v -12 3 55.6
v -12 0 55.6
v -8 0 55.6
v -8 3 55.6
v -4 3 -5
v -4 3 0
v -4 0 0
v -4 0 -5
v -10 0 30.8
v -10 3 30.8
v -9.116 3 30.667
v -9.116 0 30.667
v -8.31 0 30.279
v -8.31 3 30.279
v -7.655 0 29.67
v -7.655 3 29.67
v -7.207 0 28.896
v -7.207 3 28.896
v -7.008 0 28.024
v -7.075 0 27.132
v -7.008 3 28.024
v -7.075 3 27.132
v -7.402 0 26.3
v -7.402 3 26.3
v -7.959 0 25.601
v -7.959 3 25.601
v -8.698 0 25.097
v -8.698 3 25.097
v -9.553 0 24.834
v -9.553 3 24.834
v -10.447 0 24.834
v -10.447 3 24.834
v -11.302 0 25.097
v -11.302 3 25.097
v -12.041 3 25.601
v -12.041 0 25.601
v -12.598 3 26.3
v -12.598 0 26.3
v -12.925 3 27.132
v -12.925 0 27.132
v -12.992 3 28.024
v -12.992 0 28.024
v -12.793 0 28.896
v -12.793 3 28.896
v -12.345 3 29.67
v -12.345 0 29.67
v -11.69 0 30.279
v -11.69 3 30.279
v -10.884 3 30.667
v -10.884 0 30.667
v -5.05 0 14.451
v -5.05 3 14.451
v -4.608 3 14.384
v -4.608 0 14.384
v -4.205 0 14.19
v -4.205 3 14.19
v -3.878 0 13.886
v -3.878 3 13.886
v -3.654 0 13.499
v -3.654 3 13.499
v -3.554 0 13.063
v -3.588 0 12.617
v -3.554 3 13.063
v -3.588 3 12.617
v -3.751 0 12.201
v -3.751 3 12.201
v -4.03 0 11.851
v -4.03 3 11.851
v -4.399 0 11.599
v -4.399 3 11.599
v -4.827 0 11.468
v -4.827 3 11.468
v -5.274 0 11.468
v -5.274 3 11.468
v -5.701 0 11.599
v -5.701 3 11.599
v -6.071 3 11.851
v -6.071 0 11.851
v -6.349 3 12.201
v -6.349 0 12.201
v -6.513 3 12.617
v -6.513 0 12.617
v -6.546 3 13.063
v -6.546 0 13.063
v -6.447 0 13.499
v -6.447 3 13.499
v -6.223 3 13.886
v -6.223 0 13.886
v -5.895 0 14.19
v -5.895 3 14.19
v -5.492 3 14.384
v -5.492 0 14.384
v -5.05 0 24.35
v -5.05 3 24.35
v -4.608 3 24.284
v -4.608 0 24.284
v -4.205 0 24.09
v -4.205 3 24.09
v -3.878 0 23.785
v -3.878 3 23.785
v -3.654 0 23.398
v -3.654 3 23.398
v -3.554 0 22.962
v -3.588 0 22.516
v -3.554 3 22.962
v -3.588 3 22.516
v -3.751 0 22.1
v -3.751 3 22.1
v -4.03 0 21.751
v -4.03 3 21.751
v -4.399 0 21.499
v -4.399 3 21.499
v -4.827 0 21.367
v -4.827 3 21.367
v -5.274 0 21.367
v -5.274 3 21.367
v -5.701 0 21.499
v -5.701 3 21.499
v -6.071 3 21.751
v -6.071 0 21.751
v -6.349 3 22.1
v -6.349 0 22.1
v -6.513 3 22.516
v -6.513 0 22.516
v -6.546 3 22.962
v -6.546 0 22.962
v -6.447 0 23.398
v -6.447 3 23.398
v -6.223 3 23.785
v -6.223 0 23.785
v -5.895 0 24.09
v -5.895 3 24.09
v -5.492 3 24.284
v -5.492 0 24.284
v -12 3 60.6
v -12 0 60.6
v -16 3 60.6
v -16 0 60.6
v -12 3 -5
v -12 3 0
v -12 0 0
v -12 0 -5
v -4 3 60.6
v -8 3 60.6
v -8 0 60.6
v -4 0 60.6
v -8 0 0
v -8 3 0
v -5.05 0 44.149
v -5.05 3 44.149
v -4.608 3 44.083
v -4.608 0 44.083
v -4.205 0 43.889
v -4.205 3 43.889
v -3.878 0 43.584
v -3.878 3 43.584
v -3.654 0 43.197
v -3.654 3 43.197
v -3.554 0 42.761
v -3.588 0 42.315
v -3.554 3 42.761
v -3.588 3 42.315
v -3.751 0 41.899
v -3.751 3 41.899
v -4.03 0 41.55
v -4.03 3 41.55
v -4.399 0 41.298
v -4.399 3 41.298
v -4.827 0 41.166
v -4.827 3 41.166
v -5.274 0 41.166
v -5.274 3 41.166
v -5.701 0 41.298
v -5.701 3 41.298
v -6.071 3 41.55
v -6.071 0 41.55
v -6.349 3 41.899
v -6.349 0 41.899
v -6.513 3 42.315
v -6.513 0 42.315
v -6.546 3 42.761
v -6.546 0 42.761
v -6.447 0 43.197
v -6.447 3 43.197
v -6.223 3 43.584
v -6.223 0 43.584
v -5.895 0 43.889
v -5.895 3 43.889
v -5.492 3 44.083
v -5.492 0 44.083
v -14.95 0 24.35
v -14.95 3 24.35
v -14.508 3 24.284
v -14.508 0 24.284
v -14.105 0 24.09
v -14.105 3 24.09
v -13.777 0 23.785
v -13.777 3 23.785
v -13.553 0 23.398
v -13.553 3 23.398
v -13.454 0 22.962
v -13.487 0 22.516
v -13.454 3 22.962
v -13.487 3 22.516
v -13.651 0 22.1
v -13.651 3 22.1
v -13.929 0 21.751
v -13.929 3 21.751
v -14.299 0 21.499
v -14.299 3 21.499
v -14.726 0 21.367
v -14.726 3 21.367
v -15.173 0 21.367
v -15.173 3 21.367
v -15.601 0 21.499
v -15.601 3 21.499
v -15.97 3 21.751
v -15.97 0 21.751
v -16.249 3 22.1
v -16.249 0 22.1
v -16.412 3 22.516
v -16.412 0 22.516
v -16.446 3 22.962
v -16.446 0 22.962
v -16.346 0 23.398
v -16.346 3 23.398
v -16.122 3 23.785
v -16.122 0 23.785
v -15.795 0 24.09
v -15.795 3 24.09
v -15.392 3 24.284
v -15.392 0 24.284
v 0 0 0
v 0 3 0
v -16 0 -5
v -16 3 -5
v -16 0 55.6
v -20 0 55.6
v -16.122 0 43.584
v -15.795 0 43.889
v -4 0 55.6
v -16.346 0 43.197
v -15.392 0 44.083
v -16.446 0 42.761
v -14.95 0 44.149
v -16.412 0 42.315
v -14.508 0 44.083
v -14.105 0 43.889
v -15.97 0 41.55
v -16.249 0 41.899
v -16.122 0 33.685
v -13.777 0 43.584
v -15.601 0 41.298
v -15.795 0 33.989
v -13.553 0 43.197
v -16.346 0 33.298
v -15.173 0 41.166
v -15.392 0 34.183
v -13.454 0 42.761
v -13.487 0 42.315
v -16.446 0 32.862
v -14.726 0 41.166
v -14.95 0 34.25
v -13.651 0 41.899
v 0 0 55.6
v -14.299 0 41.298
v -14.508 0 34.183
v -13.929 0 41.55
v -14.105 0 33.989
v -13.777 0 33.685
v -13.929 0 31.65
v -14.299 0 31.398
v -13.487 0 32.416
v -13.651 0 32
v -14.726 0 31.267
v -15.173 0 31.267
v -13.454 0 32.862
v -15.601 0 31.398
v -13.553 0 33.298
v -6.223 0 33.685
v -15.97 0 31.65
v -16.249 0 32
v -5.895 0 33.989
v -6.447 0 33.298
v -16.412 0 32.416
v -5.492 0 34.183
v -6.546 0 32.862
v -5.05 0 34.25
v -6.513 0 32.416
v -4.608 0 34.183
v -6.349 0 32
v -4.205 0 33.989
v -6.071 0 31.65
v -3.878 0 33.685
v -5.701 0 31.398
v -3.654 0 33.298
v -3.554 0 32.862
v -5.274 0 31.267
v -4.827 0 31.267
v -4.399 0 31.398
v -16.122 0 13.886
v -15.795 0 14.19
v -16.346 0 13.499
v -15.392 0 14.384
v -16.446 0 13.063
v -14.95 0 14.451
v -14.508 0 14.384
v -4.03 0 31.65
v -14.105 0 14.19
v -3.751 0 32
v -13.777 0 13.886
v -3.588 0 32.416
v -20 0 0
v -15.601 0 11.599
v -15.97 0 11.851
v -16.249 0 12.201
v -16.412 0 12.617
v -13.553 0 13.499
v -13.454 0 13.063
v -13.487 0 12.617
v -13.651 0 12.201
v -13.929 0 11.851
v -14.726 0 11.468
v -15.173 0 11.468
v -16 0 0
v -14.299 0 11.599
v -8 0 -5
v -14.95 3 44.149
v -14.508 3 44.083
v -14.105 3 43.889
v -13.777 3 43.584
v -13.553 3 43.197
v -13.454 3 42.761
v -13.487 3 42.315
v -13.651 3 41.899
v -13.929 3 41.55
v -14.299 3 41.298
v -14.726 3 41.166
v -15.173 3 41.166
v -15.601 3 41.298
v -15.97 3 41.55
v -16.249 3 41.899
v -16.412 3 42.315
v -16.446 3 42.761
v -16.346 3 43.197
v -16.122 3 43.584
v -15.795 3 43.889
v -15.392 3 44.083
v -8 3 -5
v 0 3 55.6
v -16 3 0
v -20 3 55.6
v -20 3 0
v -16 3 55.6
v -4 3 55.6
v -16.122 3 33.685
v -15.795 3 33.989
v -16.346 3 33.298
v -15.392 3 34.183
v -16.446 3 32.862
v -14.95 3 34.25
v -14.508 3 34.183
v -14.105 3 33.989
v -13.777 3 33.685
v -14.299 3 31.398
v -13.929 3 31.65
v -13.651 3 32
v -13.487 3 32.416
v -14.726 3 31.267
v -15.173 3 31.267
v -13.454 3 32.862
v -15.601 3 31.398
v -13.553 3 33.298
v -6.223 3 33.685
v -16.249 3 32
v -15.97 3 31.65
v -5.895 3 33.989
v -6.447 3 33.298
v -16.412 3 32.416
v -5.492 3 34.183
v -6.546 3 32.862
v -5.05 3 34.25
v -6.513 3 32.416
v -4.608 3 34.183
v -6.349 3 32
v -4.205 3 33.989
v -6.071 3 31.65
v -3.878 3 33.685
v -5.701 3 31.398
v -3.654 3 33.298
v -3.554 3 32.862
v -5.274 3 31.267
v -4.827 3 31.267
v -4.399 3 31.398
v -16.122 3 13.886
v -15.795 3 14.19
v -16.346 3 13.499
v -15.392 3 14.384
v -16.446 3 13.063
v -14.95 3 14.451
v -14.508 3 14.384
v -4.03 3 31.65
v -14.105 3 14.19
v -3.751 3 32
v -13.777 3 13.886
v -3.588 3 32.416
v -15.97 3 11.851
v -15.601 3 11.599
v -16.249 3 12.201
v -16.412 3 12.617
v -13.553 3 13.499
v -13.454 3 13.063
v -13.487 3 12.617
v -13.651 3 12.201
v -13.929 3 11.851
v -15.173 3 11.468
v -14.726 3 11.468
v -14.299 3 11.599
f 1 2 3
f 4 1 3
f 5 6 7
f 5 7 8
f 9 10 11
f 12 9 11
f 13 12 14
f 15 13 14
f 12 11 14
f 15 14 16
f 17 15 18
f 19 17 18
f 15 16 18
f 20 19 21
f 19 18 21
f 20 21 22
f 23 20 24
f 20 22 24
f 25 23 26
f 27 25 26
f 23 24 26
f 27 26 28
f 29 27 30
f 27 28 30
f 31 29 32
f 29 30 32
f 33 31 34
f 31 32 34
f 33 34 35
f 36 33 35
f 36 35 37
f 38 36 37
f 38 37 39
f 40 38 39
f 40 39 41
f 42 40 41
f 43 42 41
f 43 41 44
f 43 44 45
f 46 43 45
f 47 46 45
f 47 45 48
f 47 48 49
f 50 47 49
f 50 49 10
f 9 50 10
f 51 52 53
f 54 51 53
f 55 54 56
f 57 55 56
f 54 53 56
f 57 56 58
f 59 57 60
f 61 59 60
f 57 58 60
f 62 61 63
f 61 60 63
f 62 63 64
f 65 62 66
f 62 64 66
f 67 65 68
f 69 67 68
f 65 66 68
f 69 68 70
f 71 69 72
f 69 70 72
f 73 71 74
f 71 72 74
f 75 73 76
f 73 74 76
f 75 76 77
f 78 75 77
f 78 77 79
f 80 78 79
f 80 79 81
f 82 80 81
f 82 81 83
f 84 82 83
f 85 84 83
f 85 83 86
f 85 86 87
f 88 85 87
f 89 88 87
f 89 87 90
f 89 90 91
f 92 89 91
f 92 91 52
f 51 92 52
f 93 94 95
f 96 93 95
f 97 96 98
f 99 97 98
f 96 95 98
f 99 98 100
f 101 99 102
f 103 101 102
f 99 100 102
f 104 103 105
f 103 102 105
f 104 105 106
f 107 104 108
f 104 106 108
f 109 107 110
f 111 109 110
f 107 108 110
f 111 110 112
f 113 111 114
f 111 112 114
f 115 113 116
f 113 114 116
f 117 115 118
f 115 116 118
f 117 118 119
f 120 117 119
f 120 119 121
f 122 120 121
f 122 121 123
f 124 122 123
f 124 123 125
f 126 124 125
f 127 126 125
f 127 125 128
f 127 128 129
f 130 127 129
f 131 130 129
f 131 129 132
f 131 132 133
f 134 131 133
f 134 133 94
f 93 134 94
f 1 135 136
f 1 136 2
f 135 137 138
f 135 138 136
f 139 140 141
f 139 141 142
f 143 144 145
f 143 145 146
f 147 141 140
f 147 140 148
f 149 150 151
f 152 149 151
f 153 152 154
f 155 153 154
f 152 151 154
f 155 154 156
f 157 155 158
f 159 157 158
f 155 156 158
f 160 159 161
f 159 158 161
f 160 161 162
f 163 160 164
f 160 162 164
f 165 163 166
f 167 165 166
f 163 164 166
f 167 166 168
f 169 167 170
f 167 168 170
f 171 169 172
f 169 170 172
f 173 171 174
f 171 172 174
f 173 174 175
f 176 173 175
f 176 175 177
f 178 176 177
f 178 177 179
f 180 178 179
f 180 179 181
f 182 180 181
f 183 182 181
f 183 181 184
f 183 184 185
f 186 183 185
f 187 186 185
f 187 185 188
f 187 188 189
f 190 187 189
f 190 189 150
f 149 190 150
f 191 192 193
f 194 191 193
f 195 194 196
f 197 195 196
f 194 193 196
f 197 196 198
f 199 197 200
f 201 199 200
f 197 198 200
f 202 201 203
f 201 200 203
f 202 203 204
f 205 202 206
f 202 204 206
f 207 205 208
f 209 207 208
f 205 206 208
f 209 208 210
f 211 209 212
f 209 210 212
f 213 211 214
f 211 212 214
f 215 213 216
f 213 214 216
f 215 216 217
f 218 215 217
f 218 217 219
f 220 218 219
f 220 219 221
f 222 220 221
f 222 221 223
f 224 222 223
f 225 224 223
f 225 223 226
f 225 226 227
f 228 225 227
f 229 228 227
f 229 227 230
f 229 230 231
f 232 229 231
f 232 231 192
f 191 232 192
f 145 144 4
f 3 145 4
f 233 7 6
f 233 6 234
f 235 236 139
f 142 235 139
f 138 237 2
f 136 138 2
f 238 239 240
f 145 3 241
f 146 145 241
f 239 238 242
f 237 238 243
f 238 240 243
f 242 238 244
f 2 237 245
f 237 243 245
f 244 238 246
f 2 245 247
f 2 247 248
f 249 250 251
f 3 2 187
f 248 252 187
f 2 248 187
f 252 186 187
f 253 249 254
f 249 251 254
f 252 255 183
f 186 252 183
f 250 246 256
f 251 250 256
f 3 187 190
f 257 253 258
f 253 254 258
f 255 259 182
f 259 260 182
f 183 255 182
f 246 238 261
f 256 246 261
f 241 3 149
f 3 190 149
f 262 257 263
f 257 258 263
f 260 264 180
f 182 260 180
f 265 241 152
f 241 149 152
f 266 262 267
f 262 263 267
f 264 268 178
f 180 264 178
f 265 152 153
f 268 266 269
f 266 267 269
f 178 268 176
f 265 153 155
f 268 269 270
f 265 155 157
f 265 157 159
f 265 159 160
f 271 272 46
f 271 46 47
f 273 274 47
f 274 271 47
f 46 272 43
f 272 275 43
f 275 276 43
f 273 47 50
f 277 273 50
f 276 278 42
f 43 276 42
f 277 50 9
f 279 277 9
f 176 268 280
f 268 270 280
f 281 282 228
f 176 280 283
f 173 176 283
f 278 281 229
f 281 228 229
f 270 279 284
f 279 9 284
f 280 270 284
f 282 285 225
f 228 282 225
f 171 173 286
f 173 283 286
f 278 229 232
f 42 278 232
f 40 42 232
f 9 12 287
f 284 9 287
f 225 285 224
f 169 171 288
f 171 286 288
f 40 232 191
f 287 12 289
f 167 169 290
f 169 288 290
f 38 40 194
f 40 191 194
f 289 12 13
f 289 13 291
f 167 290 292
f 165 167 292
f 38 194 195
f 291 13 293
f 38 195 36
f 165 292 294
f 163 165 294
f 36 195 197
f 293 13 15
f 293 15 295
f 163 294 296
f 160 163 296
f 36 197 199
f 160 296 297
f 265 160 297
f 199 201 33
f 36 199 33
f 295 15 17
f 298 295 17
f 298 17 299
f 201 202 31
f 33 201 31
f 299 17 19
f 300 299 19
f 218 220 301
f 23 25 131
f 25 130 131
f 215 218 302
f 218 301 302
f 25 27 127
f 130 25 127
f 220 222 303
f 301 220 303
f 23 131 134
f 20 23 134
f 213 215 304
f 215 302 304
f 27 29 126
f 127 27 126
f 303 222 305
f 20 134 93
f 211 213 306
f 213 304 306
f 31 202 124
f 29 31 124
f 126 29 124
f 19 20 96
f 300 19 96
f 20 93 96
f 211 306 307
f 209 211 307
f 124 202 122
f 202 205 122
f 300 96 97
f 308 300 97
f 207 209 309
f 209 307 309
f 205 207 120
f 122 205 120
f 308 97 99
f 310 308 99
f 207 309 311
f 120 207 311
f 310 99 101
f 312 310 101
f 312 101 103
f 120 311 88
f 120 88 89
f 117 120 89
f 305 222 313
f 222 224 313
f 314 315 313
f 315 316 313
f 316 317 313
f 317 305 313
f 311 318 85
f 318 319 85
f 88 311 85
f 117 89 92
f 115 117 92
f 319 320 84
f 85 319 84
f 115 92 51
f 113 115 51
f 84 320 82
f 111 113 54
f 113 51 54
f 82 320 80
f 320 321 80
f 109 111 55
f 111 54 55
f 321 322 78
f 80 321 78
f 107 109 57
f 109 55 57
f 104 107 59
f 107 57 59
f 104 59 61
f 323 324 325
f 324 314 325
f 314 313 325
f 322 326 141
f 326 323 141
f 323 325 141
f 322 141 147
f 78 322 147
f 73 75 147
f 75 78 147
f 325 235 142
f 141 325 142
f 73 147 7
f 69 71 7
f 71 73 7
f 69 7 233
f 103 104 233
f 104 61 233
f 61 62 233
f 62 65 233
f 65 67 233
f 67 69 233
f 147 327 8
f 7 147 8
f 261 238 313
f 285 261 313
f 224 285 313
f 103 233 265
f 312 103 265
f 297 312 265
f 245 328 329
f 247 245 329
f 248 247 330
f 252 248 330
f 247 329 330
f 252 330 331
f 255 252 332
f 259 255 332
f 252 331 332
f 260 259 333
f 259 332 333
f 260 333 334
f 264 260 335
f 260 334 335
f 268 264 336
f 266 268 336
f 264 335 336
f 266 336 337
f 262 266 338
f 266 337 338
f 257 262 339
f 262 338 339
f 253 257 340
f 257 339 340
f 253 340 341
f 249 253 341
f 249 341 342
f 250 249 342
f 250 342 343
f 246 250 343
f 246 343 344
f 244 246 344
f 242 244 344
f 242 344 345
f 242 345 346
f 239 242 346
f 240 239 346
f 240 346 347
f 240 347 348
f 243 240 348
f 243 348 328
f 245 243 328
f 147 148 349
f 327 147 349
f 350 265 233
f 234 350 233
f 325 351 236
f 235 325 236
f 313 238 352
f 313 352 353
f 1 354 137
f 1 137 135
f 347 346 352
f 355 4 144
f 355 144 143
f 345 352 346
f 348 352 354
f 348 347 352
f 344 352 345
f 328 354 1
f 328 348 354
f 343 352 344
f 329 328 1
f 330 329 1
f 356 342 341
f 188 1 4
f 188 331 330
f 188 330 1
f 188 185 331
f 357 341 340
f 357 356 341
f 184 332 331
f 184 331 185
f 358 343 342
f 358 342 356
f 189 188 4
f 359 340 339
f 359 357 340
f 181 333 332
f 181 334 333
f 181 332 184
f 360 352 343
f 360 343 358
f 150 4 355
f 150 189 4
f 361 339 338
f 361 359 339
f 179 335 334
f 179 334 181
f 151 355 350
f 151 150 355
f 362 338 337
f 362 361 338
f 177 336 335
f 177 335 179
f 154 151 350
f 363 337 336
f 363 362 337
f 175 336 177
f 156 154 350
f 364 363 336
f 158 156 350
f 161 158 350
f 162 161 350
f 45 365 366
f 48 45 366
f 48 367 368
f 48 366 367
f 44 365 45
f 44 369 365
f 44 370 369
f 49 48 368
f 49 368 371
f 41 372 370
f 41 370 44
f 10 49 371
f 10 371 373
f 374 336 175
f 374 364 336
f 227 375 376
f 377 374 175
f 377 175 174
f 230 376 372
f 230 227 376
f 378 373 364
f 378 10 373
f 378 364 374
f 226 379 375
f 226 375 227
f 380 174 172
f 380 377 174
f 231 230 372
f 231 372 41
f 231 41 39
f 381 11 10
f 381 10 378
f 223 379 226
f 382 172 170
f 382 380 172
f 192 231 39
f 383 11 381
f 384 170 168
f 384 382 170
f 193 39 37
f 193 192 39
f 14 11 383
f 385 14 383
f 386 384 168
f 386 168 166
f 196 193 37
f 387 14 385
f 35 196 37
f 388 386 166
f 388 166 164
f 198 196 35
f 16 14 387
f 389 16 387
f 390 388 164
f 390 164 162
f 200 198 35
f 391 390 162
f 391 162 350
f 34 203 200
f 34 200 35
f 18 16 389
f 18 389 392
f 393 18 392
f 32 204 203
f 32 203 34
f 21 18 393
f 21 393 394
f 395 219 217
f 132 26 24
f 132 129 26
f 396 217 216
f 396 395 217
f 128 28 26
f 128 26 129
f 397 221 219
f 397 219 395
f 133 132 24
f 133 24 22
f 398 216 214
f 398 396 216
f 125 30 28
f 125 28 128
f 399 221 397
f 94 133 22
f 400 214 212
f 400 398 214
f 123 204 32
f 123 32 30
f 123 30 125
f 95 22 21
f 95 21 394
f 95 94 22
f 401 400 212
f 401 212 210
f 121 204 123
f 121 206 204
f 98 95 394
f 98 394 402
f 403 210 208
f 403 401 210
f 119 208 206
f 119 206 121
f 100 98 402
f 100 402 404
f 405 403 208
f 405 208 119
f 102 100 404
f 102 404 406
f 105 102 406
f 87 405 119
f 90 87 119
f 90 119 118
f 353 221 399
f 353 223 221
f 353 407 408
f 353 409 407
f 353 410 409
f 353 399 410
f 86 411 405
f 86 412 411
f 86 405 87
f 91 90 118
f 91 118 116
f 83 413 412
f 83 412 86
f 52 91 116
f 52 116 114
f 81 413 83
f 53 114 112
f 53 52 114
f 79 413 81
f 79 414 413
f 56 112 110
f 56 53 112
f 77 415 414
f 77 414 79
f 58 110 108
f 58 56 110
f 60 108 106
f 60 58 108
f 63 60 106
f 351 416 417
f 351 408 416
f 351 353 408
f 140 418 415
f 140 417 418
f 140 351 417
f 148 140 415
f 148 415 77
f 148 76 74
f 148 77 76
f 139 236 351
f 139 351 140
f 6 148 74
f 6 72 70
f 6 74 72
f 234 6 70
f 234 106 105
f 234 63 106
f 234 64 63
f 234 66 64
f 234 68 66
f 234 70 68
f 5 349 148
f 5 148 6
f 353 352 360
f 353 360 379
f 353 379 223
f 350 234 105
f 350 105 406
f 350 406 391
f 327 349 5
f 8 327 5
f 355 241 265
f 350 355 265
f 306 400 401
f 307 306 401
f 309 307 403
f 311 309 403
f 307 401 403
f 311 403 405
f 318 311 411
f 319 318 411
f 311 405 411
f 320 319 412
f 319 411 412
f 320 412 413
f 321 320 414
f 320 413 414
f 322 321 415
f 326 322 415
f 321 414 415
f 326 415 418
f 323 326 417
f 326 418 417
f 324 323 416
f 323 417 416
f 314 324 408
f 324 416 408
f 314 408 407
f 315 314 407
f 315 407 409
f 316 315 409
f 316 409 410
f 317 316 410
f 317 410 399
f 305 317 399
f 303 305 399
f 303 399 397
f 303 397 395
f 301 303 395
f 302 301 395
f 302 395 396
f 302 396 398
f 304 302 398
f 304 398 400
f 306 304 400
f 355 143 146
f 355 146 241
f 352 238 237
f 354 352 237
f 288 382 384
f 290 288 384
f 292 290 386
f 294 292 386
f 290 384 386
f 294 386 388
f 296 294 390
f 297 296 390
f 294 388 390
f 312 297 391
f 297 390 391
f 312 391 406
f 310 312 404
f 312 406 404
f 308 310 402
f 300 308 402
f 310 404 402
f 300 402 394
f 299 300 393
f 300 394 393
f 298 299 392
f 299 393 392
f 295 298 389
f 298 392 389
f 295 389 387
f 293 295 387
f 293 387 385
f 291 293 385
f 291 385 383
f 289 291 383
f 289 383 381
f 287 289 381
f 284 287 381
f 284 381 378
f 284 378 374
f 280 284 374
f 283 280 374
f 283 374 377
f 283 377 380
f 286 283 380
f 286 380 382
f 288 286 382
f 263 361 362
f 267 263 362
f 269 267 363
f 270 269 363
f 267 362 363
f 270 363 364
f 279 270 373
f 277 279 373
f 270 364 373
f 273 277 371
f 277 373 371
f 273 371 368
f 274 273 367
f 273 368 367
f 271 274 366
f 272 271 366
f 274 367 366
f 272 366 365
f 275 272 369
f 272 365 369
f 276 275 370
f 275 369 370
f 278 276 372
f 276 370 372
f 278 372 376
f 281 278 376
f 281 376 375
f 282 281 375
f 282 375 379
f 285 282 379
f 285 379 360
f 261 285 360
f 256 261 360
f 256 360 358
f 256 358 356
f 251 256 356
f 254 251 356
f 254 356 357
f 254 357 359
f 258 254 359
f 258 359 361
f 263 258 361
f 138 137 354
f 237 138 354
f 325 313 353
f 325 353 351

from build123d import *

# Parameters (mm, degrees)
SKETCH_1_W          = 20
SKETCH_1_H          = 55.6
EXTRUDE_1_DEPTH     = 3
SKETCH_2_W          = 4
SKETCH_2_H          = 5
EXTRUDE_2_DEPTH     = 3
SKETCH_3_R          = 1.5
SKETCH_3_R_2        = 3
CUT_EXTRUDE_1_DEPTH = 10


with BuildPart() as part:
    # 草图1 → 凸台-拉伸1 (new body)
    with BuildSketch(Plane(origin=(0, 0, 0), x_dir=(1, 0, 0), z_dir=(0, 1, 0))):
        with Locations((-10, -27.8)):
            Rectangle(SKETCH_1_W, SKETCH_1_H)
    extrude(amount=EXTRUDE_1_DEPTH)

    # 草图2 → 凸台-拉伸2 (add)
    with BuildSketch(Plane(origin=(0, 3, 0), x_dir=(1, 0, 0), z_dir=(0, 1, 0))):
        with Locations((-14, 2.5)):
            Rectangle(SKETCH_2_W, SKETCH_2_H)
        with Locations((-6, 2.5)):
            Rectangle(SKETCH_2_W, SKETCH_2_H)
        with Locations((-14, -58.1)):
            Rectangle(SKETCH_2_W, SKETCH_2_H)
        with Locations((-6, -58.1)):
            Rectangle(SKETCH_2_W, SKETCH_2_H)
    extrude(amount=-EXTRUDE_2_DEPTH)

    # 草图3 → 切除-拉伸1 (cut)
    with BuildSketch(Plane(origin=(0, 3, 0), x_dir=(1, 0, 0), z_dir=(0, 1, 0))):
        with Locations(Location((-5.050252532, -22.850252532, 0), (0, 0, 270))):
            Circle(SKETCH_3_R)
        with Locations(Location((-10, -27.8, 0), (0, 0, 270))):
            Circle(SKETCH_3_R_2)
        with Locations(Location((-14.949747468, -32.749747468, 0), (0, 0, 270))):
            Circle(SKETCH_3_R)
        with Locations(Location((-5.050252532, -32.749747468, 0), (0, 0, 270))):
            Circle(SKETCH_3_R)
        with Locations(Location((-14.949747468, -22.850252532, 0), (0, 0, 270))):
            Circle(SKETCH_3_R)
        with Locations(Location((-14.949747468, -12.950757595, 0), (0, 0, 270))):
            Circle(SKETCH_3_R)
        with Locations(Location((-5.050252532, -12.950757595, 0), (0, 0, 270))):
            Circle(SKETCH_3_R)
        with Locations(Location((-14.949747468, -42.649242405, 0), (0, 0, 270))):
            Circle(SKETCH_3_R)
        with Locations(Location((-5.050252532, -42.649242405, 0), (0, 0, 270))):
            Circle(SKETCH_3_R)
    extrude(amount=-CUT_EXTRUDE_1_DEPTH, mode=Mode.SUBTRACT)


solid = part.part
